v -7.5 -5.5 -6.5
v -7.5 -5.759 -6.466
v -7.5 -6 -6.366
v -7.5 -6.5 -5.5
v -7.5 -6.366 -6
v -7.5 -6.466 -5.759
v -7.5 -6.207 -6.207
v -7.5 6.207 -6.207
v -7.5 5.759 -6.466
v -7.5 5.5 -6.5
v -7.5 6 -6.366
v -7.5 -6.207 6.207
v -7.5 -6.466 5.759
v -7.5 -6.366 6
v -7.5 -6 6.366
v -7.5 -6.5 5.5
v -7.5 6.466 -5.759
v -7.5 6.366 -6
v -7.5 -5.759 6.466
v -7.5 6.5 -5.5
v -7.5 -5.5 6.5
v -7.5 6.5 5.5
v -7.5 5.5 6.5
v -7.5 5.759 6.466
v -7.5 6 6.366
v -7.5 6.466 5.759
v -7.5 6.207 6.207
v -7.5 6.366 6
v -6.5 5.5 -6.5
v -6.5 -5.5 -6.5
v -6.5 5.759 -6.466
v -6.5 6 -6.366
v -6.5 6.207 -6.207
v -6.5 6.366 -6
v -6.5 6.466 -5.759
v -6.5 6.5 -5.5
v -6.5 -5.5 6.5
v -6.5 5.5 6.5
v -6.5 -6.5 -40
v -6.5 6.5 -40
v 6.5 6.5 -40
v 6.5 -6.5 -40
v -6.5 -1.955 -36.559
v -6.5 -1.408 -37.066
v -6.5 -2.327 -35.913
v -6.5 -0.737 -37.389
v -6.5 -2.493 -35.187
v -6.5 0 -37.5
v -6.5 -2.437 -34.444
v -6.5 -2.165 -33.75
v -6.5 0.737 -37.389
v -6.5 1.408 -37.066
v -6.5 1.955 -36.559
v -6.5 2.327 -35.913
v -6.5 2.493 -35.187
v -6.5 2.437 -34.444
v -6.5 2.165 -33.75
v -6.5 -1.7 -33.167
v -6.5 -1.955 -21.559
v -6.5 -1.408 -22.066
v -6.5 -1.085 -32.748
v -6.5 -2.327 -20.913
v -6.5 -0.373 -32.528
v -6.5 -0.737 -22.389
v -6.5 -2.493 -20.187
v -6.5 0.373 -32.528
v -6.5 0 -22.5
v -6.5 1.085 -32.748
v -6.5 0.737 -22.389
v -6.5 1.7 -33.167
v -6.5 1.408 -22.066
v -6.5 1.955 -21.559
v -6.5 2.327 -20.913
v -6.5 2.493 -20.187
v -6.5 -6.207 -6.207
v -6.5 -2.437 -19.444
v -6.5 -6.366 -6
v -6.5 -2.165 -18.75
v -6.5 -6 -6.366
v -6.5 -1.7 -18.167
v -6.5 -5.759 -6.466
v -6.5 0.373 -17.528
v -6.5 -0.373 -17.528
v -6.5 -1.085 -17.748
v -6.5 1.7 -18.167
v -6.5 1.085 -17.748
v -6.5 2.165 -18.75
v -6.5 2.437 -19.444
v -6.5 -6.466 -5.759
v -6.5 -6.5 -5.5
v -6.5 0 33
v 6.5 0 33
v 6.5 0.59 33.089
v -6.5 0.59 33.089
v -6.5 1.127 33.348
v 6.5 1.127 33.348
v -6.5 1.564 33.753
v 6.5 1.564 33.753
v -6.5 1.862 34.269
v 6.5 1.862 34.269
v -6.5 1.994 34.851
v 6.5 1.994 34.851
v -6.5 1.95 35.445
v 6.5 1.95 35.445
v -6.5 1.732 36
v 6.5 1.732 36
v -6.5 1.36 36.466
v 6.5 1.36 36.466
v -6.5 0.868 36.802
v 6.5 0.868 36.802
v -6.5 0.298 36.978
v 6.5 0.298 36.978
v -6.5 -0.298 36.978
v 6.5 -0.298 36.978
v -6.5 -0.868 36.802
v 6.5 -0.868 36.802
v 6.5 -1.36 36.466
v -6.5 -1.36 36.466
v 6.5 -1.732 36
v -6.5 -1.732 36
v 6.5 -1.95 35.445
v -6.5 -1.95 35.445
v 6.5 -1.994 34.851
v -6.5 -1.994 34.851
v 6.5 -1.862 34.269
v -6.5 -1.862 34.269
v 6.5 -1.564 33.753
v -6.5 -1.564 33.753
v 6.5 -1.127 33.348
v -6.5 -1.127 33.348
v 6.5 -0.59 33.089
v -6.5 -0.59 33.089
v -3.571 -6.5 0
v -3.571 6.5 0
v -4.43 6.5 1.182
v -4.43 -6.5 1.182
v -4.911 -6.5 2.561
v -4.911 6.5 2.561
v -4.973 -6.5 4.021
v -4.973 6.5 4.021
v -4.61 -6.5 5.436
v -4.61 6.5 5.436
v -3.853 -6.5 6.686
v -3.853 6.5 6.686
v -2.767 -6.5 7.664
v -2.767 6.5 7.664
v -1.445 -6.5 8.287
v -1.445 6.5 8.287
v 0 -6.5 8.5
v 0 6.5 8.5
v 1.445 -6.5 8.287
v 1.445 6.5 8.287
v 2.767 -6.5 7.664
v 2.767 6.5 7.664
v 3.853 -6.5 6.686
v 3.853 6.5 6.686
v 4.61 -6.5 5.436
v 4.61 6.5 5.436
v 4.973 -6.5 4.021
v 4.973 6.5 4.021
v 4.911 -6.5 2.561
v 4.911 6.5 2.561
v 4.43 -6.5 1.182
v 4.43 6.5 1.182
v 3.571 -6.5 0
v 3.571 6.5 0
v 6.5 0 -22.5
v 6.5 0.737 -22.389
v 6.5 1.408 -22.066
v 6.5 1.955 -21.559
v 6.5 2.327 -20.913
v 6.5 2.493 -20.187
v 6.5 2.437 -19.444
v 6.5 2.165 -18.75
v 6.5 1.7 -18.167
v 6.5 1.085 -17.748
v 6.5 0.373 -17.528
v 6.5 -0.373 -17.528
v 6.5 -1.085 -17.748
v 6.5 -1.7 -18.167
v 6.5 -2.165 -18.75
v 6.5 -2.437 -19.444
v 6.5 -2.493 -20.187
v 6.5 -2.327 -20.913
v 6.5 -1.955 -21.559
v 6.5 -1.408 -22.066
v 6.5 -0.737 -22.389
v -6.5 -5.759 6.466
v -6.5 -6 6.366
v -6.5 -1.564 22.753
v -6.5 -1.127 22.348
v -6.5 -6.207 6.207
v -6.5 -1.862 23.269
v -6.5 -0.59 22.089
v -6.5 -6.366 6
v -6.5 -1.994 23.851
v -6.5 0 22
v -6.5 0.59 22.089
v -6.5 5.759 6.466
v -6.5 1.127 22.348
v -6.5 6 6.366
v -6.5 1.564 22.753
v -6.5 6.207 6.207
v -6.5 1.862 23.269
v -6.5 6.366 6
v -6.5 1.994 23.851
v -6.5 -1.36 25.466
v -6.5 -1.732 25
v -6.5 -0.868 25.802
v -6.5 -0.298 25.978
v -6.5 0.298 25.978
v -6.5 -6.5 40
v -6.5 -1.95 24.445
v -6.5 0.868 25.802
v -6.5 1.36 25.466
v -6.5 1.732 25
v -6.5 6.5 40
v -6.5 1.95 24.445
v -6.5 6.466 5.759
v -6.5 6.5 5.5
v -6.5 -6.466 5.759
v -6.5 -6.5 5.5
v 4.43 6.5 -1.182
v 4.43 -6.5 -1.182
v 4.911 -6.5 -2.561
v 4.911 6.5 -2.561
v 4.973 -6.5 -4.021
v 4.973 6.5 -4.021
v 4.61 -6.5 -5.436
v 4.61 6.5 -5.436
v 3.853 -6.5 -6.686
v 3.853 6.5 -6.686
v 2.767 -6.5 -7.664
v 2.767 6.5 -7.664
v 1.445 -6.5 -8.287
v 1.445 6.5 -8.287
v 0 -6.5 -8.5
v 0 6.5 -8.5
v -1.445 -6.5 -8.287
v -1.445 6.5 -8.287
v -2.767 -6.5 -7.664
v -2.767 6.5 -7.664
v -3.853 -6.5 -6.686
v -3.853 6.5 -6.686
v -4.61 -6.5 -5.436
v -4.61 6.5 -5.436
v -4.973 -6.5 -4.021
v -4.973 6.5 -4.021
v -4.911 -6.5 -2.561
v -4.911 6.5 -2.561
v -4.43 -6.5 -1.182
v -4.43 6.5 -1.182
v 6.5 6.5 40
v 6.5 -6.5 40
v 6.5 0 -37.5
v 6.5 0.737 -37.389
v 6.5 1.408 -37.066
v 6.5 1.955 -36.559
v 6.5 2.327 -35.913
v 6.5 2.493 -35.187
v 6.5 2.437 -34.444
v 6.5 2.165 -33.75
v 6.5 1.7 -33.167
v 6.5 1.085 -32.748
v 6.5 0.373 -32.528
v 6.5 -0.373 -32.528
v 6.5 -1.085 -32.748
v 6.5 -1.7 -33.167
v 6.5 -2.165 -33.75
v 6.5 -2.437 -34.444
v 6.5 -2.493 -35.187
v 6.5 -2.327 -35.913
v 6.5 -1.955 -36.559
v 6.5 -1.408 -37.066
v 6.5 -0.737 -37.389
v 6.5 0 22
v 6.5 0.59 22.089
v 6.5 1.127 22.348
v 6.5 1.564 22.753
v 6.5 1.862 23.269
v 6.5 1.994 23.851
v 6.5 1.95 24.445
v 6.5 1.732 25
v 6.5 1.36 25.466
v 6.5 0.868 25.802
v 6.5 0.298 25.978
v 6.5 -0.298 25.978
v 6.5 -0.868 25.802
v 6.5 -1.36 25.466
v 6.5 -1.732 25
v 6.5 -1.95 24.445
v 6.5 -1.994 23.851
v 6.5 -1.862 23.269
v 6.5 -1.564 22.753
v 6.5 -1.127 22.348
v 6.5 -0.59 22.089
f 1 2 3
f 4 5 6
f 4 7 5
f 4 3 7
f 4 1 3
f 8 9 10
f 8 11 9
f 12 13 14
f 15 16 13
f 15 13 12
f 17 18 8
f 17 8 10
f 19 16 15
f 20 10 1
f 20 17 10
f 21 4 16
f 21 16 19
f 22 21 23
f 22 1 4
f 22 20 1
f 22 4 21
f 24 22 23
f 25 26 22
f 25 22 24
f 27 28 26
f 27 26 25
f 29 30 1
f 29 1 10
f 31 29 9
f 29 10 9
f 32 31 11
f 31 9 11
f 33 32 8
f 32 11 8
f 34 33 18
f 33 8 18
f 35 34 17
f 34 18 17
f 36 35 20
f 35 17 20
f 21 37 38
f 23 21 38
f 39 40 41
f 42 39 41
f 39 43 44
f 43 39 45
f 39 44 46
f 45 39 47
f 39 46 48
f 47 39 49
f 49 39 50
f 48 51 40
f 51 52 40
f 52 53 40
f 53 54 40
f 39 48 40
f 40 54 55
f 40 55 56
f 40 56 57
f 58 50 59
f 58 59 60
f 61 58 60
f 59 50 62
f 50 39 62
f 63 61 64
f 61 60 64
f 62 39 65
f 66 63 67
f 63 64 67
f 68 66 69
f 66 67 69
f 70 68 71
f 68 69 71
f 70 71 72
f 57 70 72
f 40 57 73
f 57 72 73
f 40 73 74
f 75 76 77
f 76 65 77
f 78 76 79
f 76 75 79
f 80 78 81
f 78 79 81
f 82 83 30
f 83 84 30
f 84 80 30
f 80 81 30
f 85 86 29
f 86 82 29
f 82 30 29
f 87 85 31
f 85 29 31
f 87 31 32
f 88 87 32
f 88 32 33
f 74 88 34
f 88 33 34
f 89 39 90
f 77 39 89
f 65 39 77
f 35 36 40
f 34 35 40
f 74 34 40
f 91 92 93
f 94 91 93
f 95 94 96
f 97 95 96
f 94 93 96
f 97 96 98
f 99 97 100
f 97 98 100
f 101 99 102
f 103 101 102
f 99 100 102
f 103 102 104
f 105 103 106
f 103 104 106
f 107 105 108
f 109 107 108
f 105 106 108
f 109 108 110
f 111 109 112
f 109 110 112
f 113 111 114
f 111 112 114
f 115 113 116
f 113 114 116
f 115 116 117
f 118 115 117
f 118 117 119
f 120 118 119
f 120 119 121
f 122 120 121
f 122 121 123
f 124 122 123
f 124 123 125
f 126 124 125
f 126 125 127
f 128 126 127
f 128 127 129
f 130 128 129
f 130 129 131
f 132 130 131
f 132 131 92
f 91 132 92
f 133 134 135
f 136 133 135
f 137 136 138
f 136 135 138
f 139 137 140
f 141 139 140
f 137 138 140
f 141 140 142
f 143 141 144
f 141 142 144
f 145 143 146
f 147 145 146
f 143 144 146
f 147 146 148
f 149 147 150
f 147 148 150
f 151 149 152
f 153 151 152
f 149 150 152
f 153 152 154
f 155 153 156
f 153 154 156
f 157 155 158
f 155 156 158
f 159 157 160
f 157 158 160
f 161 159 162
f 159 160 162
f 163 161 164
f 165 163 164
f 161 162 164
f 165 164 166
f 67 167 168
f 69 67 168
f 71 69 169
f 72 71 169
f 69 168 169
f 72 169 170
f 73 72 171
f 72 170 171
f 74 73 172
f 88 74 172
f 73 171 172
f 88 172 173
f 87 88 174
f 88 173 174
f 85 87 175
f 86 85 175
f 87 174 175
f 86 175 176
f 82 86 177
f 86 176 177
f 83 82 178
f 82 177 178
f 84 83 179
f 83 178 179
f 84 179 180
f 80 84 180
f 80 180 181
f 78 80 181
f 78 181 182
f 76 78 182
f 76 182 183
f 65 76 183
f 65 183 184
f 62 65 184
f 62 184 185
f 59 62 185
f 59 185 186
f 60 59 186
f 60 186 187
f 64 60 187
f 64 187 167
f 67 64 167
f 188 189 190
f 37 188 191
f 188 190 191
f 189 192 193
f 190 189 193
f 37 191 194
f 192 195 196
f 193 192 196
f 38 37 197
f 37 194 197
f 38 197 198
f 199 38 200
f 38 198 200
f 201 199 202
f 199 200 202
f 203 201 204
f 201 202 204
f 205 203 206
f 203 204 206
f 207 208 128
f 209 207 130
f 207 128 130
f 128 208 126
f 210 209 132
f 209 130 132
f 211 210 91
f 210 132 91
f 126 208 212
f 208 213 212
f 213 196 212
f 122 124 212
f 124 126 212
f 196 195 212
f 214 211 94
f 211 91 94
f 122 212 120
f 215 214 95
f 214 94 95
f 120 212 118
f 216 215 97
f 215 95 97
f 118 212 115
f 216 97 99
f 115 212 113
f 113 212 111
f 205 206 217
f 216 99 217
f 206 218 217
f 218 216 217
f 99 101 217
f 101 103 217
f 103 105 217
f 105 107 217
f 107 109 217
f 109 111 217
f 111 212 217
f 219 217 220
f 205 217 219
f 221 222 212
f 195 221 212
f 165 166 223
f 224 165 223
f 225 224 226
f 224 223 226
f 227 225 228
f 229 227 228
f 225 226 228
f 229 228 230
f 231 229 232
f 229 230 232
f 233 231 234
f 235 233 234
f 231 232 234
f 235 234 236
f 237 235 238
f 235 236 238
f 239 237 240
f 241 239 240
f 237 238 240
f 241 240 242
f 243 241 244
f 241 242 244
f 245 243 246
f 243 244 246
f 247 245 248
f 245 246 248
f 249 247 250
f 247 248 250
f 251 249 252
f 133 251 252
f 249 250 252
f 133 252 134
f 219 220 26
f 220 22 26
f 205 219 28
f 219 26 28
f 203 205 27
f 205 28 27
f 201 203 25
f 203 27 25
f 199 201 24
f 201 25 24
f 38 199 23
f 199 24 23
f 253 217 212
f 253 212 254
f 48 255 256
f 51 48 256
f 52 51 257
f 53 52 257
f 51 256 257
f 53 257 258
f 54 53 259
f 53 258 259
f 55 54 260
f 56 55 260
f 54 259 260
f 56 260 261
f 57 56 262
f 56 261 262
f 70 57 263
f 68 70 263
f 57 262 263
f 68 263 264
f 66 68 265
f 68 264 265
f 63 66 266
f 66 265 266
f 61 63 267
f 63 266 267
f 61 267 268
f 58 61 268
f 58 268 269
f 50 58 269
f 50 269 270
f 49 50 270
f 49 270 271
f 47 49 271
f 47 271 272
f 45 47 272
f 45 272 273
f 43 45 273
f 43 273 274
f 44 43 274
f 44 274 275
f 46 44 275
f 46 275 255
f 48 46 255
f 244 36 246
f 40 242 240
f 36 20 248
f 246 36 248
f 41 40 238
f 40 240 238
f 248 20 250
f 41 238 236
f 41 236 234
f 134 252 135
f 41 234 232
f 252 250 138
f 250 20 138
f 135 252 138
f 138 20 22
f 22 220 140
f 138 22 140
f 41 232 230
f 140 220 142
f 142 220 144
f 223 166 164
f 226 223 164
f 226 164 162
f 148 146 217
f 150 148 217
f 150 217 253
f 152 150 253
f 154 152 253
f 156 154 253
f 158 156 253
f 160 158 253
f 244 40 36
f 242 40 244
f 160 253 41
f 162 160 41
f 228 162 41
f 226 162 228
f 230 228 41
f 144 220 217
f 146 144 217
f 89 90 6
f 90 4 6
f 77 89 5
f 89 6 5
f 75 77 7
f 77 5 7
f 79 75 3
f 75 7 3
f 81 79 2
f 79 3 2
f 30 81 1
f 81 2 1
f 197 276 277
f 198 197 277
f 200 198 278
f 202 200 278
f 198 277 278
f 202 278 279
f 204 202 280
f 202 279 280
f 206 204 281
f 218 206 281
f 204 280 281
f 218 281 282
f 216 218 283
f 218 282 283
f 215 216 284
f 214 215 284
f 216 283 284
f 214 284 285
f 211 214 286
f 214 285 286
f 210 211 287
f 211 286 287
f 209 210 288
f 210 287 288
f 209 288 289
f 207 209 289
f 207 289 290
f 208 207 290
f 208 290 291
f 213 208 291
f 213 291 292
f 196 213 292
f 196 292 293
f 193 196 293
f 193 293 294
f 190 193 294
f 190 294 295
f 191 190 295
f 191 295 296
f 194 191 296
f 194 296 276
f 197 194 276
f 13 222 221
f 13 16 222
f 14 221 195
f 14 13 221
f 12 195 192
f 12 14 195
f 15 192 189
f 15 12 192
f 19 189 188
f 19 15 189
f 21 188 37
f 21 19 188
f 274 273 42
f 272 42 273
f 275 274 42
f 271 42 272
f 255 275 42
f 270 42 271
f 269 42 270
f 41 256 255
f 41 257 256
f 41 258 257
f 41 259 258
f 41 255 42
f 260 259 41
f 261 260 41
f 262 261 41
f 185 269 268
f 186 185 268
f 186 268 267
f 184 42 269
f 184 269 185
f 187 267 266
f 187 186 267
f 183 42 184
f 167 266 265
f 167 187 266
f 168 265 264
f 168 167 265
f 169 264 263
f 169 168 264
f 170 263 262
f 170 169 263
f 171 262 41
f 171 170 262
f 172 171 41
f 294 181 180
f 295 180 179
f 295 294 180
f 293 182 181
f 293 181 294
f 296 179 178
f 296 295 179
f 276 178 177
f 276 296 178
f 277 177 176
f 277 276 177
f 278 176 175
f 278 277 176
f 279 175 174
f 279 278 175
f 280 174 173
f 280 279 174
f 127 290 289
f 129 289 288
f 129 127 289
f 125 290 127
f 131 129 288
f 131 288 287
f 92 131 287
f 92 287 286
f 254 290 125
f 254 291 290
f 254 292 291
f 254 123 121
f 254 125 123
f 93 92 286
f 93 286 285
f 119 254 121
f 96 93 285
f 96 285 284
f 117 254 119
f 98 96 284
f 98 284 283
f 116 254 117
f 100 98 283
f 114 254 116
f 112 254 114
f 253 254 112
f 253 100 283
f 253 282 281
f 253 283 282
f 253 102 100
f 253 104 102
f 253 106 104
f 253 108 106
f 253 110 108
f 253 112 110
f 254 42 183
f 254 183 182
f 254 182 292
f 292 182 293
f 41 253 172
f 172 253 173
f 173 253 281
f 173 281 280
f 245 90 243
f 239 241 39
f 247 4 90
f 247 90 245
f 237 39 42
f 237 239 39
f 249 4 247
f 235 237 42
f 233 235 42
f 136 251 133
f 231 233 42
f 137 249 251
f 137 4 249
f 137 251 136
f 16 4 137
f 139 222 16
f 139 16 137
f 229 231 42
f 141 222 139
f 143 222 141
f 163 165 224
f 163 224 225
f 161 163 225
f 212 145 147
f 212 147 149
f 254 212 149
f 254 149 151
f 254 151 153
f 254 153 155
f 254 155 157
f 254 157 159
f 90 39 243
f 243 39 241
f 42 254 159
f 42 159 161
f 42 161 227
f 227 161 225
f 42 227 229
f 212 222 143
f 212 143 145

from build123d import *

# Parameters (mm, degrees)
SKETCH1_W           = 13
SKETCH1_H           = 13
BOSS_EXTRUDE1_DEPTH = 40
CUT_EXTRUDE1_DEPTH  = 43.558782877
SKETCH3_R           = 2
SKETCH3_R_2         = 2.5
CUT_EXTRUDE2_DEPTH  = 43.558782877
SKETCH5_W           = 13
SKETCH5_H           = 13
BOSS_EXTRUDE2_DEPTH = 1
FILLET1_R           = 1


with BuildPart() as part:
    # Sketch1 → Boss-Extrude1 (new, symmetric)
    with BuildSketch(Plane.XY):
        Rectangle(SKETCH1_W, SKETCH1_H)
    extrude(amount=BOSS_EXTRUDE1_DEPTH, both=True)

    # Sketch2 → Cut-Extrude1 (cut, through all)
    with BuildSketch(Plane(origin=(0, 6.5, 0), x_dir=(1, 0, 0), z_dir=(0, 1, 0))):
        with BuildLine():
            ThreePointArc((3.570714214, 0), (0, 8.5), (-3.570714214, 0))
            ThreePointArc((-3.570714214, 0), (0, -8.5), (3.570714214, 0))
        make_face()
    extrude(amount=-CUT_EXTRUDE1_DEPTH, mode=Mode.SUBTRACT)

    # Sketch3 → Cut-Extrude2 (cut, through all)
    with BuildSketch(Plane(origin=(6.5, 0, 0), x_dir=(0, 0, -1), z_dir=(1, 0, 0))):
        with Locations((-35, 0)):
            Circle(SKETCH3_R)
        with Locations((-24, 0)):
            Circle(SKETCH3_R)
        with Locations((20, 0)):
            Circle(SKETCH3_R_2)
        with Locations((35, 0)):
            Circle(SKETCH3_R_2)
    extrude(amount=-CUT_EXTRUDE2_DEPTH, mode=Mode.SUBTRACT)

    # Sketch5 → Boss-Extrude2 (add)
    with BuildSketch(Plane.ZY.offset(6.5)):
        Rectangle(SKETCH5_W, SKETCH5_H)
    extrude(amount=BOSS_EXTRUDE2_DEPTH)

    # Fillet1
    fillet1_edges = [part.edges().sort_by_distance(p)[0] for p in [
        (-7, -6.5, 6.5),
        (-7, 6.5, 6.5),
        (-7, 6.5, -6.5),
        (-7, -6.5, -6.5),
    ]]
    fillet(fillet1_edges, radius=FILLET1_R)


solid = part.part
